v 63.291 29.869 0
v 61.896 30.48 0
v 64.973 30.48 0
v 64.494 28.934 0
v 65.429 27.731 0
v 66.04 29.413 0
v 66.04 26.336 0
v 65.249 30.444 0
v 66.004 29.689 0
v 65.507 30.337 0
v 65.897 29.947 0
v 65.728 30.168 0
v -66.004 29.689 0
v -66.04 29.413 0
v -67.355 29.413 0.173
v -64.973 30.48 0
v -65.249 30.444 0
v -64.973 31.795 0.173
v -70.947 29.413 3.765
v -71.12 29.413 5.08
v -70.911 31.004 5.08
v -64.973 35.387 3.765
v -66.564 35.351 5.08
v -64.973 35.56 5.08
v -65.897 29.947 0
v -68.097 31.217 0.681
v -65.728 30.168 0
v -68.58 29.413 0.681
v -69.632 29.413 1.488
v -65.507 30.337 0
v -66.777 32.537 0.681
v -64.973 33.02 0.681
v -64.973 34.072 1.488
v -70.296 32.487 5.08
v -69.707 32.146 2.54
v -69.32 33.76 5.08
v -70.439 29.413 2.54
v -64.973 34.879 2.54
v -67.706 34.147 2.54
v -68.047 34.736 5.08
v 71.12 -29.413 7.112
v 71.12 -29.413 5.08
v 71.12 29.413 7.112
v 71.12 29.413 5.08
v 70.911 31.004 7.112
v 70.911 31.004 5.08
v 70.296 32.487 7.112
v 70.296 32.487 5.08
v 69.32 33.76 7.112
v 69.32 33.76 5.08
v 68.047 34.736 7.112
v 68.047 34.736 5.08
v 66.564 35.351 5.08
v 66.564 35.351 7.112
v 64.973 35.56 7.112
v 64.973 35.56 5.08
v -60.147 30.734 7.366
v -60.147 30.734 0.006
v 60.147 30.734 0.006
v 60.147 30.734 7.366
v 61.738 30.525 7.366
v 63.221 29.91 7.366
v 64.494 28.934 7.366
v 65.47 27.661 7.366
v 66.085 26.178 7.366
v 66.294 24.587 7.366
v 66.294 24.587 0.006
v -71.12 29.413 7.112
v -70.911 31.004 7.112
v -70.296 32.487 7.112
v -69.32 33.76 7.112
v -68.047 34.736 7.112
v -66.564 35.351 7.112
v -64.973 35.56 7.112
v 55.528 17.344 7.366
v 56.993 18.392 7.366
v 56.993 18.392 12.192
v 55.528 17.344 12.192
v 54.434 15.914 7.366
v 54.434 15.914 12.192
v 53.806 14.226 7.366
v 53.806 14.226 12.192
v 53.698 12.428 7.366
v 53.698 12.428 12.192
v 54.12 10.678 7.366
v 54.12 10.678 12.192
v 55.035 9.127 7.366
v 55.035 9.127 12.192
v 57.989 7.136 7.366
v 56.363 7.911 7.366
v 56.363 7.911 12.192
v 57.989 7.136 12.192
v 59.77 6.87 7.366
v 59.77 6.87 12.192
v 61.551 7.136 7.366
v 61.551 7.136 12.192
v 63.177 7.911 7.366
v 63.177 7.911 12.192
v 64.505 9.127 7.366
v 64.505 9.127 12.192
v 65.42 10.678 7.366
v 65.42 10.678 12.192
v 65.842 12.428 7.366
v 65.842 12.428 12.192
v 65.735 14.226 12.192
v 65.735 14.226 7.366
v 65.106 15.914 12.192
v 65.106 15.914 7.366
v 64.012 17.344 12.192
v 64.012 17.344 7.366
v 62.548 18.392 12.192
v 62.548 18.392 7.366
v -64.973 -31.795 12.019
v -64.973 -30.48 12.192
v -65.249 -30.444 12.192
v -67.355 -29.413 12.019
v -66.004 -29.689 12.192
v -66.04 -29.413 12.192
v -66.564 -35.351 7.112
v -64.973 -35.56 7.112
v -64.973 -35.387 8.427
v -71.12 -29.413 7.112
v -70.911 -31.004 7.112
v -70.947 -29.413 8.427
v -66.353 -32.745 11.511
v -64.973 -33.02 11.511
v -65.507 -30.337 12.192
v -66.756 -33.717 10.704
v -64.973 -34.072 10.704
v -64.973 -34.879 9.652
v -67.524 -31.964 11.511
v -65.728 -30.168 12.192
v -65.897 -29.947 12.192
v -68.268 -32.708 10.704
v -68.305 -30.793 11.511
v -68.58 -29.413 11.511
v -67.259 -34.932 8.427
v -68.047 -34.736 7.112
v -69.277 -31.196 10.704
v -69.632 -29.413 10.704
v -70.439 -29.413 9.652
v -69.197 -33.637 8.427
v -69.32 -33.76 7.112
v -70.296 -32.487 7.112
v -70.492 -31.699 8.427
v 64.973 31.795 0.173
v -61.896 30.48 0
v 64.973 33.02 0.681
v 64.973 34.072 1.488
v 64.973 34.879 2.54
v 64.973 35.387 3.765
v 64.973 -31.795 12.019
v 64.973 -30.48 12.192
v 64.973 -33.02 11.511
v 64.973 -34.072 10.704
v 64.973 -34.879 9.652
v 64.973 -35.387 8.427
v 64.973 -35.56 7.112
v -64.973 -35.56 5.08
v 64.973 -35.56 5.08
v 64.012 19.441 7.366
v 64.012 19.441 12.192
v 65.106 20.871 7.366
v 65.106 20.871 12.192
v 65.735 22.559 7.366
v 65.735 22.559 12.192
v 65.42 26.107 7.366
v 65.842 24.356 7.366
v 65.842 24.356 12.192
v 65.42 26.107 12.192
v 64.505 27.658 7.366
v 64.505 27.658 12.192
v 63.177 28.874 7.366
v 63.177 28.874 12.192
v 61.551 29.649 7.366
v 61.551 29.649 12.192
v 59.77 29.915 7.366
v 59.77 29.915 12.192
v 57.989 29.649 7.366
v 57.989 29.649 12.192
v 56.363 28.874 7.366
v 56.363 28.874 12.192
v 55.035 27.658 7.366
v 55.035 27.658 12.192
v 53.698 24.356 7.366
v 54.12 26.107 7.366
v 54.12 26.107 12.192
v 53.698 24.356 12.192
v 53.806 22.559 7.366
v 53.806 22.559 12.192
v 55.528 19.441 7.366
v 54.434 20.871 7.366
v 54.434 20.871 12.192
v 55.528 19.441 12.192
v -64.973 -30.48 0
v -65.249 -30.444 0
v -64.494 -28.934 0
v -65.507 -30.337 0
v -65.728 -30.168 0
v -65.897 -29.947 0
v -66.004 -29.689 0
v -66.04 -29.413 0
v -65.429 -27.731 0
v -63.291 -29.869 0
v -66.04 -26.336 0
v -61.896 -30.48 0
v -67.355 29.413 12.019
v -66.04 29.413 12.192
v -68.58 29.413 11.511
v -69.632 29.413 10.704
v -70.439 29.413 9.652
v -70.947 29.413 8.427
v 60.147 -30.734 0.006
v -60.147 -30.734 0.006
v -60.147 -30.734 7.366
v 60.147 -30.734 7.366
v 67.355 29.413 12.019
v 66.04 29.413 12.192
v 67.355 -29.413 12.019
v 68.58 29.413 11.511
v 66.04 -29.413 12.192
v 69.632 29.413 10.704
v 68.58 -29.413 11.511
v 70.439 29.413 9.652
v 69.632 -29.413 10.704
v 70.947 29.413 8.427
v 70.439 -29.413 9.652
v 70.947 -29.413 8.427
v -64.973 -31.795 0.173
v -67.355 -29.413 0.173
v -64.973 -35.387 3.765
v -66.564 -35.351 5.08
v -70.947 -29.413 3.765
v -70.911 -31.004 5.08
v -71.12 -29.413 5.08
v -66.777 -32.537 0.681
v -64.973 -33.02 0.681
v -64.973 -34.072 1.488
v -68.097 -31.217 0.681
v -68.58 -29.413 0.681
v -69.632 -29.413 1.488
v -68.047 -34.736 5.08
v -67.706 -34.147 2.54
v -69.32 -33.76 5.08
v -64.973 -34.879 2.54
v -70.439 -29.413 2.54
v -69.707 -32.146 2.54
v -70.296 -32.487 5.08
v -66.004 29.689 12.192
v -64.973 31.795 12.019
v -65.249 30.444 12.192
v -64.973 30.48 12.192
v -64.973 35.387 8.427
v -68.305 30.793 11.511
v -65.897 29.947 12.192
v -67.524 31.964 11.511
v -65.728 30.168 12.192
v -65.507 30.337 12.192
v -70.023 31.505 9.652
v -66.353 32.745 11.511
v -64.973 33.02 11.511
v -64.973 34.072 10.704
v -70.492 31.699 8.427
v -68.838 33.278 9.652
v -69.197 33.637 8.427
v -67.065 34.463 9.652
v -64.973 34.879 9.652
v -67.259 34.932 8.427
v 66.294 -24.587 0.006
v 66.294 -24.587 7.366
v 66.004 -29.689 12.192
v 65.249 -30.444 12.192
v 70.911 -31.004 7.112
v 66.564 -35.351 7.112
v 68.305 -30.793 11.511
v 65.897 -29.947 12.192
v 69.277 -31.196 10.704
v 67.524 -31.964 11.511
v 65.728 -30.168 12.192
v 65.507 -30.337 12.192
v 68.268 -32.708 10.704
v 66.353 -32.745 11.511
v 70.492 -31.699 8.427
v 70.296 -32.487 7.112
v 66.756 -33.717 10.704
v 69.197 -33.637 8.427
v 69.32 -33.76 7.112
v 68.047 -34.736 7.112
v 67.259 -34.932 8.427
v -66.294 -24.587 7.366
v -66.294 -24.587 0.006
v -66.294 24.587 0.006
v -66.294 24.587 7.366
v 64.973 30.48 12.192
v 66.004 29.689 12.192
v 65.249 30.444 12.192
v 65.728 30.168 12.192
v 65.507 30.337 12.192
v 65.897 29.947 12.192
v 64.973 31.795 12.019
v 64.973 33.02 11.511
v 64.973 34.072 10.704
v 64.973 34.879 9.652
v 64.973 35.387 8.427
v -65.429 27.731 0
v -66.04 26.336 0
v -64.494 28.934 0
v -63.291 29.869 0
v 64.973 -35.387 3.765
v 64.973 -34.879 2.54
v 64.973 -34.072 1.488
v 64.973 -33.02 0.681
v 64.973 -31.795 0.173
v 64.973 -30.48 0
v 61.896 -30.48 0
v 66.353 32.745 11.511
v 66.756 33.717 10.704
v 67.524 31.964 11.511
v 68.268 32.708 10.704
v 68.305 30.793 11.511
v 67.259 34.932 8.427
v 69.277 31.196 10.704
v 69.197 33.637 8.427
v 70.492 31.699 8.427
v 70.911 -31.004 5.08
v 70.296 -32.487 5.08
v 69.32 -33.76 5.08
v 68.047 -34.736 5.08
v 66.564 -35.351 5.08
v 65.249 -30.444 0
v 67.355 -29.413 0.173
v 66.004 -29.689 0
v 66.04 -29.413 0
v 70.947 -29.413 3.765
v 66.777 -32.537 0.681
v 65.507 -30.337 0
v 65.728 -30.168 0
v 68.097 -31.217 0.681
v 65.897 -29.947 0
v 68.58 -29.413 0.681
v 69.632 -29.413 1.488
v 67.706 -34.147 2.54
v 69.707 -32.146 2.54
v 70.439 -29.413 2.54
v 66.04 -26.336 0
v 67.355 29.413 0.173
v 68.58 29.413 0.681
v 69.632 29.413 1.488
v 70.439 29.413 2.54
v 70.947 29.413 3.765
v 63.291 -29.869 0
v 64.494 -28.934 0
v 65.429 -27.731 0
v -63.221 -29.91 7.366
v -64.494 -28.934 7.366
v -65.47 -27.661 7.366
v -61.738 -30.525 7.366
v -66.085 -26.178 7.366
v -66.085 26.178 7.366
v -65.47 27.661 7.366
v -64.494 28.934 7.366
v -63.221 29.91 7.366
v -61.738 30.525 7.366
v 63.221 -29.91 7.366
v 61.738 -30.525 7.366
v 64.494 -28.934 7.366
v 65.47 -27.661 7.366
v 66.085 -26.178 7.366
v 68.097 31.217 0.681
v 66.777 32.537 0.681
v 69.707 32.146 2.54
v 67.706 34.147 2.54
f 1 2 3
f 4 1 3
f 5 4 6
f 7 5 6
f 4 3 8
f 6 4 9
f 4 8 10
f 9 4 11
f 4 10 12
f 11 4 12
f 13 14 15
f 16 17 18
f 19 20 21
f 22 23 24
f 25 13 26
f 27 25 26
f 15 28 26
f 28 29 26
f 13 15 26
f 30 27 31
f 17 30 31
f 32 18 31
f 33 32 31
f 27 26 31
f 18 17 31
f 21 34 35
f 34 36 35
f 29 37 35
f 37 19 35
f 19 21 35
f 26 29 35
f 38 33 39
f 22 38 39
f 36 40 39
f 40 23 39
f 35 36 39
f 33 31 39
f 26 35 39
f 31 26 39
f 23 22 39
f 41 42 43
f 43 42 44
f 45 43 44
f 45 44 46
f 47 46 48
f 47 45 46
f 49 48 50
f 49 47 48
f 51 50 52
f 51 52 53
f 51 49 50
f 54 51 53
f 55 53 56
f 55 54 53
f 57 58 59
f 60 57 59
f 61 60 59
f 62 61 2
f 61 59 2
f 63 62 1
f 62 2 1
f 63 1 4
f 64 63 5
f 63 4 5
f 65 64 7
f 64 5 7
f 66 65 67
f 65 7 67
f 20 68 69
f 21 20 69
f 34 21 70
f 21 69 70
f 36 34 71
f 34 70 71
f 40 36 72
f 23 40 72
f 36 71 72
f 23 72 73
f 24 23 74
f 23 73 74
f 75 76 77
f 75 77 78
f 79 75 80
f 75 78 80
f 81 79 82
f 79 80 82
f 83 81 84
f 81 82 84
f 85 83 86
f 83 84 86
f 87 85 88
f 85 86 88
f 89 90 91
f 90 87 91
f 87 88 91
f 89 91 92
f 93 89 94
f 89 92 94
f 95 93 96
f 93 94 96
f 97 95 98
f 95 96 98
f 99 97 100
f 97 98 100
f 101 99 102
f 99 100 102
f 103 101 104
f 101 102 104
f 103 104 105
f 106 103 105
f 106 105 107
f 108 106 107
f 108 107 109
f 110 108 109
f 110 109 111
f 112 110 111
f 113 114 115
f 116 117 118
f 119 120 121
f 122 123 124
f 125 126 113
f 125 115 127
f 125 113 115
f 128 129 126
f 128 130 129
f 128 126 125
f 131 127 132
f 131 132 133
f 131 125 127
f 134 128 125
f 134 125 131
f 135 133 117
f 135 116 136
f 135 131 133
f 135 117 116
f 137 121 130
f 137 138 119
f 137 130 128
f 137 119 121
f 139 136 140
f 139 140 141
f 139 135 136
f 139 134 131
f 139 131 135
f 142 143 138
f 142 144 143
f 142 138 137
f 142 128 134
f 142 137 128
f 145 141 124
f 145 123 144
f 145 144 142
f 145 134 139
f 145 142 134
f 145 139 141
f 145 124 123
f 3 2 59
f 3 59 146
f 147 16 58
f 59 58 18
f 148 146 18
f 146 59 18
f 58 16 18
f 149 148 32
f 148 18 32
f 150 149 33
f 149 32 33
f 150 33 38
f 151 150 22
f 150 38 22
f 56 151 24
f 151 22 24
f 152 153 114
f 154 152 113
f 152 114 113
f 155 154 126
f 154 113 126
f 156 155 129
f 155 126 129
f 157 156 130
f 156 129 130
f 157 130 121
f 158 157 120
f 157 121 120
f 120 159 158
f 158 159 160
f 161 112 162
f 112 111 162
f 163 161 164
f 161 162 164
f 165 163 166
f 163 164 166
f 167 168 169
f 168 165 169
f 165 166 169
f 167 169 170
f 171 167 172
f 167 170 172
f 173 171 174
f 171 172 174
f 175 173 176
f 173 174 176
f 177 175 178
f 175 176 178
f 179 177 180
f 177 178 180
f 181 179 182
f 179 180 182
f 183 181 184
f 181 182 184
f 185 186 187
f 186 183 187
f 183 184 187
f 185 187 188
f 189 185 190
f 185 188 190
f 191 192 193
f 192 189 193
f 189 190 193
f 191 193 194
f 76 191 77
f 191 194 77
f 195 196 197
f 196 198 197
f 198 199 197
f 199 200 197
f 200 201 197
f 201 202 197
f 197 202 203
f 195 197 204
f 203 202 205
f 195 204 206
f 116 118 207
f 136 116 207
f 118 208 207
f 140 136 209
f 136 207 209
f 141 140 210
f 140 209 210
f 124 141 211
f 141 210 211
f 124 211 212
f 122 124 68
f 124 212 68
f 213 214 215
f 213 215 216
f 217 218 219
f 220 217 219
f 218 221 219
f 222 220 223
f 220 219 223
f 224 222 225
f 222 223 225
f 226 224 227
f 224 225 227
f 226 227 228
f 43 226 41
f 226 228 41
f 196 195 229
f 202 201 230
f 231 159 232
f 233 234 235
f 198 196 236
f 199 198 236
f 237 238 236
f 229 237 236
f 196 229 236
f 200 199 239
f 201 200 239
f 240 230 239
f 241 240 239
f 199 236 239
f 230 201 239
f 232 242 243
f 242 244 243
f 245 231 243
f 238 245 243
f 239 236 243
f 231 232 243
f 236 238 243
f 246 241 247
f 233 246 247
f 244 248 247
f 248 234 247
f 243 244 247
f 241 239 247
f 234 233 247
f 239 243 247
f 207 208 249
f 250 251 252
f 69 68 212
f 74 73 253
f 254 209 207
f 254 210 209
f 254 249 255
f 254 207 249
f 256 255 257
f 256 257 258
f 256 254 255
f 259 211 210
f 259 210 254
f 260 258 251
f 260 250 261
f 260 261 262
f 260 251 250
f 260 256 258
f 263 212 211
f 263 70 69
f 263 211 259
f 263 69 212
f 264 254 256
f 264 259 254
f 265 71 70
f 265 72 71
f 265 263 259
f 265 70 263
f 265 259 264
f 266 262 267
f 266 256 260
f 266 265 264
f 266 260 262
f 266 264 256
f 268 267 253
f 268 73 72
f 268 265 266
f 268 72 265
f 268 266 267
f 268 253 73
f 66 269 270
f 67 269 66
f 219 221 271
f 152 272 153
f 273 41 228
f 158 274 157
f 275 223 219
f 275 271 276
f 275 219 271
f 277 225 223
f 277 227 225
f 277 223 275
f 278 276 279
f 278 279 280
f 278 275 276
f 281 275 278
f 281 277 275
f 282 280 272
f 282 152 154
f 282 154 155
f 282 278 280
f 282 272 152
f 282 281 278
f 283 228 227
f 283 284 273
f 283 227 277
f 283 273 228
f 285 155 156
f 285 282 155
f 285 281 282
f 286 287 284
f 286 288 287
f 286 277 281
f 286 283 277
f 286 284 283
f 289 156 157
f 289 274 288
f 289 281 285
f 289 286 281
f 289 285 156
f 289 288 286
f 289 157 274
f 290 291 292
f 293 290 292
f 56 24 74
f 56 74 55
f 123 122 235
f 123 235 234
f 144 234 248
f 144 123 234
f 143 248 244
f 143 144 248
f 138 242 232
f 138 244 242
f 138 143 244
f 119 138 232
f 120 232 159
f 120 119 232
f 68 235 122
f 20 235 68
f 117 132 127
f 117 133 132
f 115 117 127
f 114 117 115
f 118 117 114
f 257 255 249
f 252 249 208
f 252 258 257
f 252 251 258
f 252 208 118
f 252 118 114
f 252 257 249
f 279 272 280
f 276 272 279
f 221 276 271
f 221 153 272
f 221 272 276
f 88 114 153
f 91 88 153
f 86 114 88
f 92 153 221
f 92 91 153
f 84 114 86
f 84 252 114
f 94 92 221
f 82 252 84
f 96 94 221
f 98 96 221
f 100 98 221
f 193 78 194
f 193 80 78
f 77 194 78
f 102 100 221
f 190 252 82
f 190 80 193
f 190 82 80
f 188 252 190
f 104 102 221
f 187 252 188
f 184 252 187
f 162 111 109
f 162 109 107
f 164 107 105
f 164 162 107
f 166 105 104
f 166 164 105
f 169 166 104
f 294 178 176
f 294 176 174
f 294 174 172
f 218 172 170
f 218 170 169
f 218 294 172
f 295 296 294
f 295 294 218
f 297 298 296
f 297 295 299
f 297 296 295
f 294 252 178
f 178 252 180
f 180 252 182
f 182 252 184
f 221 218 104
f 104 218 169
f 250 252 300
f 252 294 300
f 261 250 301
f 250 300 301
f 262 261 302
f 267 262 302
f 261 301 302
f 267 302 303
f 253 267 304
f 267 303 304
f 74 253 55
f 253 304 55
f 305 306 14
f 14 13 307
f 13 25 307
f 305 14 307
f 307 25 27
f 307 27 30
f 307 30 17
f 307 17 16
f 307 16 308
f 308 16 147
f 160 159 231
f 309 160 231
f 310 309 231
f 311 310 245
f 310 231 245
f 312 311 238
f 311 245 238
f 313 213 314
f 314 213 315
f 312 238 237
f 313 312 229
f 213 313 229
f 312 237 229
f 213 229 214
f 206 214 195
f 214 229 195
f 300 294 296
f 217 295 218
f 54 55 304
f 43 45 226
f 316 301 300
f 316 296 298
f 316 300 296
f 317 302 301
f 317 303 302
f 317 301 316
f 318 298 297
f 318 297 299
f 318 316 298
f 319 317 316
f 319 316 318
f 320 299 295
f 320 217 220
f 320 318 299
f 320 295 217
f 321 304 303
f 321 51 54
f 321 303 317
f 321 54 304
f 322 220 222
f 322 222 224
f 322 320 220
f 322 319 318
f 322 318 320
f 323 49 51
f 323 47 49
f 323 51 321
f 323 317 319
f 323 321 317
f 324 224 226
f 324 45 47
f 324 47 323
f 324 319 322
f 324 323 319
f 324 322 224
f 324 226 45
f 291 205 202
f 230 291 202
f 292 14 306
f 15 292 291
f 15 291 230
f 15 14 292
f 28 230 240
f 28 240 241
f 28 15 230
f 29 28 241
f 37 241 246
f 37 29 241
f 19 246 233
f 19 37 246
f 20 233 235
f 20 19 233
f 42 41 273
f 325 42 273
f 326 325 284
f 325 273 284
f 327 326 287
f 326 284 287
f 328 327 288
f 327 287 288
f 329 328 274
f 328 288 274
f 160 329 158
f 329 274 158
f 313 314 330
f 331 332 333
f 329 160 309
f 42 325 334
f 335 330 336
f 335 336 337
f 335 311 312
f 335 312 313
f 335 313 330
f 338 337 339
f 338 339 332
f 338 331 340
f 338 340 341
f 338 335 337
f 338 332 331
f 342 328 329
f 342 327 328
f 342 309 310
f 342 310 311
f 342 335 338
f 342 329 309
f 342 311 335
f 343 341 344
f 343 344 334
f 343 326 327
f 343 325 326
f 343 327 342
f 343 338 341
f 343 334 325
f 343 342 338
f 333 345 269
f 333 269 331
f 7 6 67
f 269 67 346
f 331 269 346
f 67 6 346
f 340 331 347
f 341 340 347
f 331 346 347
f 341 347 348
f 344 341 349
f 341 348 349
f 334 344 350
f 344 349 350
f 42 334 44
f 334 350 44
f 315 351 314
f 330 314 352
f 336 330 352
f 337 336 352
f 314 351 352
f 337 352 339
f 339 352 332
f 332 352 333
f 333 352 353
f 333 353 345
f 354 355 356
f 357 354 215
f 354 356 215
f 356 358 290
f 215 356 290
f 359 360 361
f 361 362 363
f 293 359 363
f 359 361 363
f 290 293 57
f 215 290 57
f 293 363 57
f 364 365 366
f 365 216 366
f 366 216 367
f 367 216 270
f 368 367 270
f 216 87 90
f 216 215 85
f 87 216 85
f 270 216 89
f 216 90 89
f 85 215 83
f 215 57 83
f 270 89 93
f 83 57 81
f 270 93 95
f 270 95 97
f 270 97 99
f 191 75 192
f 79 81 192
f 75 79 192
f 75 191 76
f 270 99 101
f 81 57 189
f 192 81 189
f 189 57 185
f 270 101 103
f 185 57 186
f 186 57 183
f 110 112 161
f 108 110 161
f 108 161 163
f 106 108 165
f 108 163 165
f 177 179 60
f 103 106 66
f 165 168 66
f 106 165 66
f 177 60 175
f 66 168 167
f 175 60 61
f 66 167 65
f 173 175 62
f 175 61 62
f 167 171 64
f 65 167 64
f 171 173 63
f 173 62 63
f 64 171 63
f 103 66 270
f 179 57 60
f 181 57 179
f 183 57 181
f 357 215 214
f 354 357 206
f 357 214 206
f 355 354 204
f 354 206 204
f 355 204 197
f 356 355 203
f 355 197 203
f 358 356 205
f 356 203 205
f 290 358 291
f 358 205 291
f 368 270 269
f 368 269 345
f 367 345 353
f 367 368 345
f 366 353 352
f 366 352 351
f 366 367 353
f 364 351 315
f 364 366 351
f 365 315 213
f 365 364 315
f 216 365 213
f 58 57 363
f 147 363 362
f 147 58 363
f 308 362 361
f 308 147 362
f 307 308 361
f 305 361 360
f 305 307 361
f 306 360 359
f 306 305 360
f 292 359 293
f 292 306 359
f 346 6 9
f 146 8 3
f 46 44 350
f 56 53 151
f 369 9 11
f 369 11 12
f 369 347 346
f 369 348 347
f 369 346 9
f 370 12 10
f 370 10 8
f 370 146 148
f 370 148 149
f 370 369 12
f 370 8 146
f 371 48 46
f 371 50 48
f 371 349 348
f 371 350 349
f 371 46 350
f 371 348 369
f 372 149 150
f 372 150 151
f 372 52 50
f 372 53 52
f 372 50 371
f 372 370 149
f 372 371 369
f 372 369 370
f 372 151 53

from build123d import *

# Parameters (mm, degrees)
F0_W         = 142.24
F0_H         = 71.12
F1_DEPTH     = 12.192
F3_T         = -4.826
F4_D         = 12.192
F5_R         = 6.1468
F6_T1_DEPTH  = 129.9464
F6_T3_DEPTH  = 58.8264
F6_T6_ANGLE  = 90
F6_T8_ANGLE  = 90
F6_T10_ANGLE = 90
F6_T12_ANGLE = 90
F7_R         = 5.08


# Not quite as in the source:
# - a fillet or chamfer that OpenCascade refuses, or shapes differently, is made with other operations: its cross-section is extruded or revolved along the edge and cut away or added
# - a feature names something its author has since deleted; it is built from what else it names


with BuildPart() as f1:
    # F0 (on Top) → F1 (new body)
    with BuildSketch(Plane.XY):
        Rectangle(F0_W, F0_H)
    extrude(amount=F1_DEPTH)

    # F3
    f3_openings = [f1.faces().sort_by_distance(p)[0] for p in [
        (0, 0, 0),
    ]]
    offset(amount=F3_T, openings=f3_openings)

    # F4 (through all)
    with Locations(Plane(origin=(0, 0, 0), x_dir=(1, 0, 0), z_dir=(0, 0, -1))):
        with Locations((59.7701932977, -12.9658412188), (59.7701932977, -23.8187816803)):
            Hole(F4_D / 2)

    # F5
    f5_edges = [f1.edges().sort_by_distance(p)[0] for p in [
        (66.294, -30.734, 3.683),
        (66.294, 30.734, 3.683),
        (-66.294, 30.734, 3.683),
        (-66.294, -30.734, 3.683),
        (-71.12, 35.56, 6.096),
        (-71.12, -35.56, 6.096),
        (71.12, -35.56, 6.096),
        (71.12, 35.56, 6.096),
    ]]
    fillet(f5_edges, radius=F5_R)

    # F6: fillet of radius 5.08 on 1 edges, made by hand

    # F6_s2 → F6_t1 (cut)
    with BuildSketch(Plane.YZ.offset(-64.9732)):
        with BuildLine():
            ThreePointArc((30.48, 0), (34.0721024484, 1.4878975516), (35.56, 5.08))
            Line((35.56, 5.08), (35.56, 0))
            Line((35.56, 0), (30.48, 0))
        make_face()
        with BuildLine():
            ThreePointArc((-35.56, 5.08), (-34.0721024484, 1.4878975516), (-30.48, 0))
            Line((-30.48, 0), (-35.56, 0))
            Line((-35.56, 0), (-35.56, 5.08))
        make_face()
    extrude(amount=F6_T1_DEPTH, mode=Mode.SUBTRACT)

    # F6_s4 → F6_t3 (cut)
    with BuildSketch(Plane.XZ.offset(-29.4132)):
        with BuildLine():
            ThreePointArc((-66.04, 0), (-69.6321024484, 1.4878975516), (-71.12, 5.08))
            Line((-71.12, 5.08), (-71.12, 0))
            Line((-71.12, 0), (-66.04, 0))
        make_face()
        with BuildLine():
            ThreePointArc((66.04, 0), (69.6321024484, 1.4878975516), (71.12, 5.08))
            Line((71.12, 5.08), (71.12, 0))
            Line((71.12, 0), (66.04, 0))
        make_face()
    extrude(amount=F6_T3_DEPTH, mode=Mode.SUBTRACT)

    # F6_s5 → F6_t6 (revolve, cut)
    with BuildSketch(Plane.XZ.offset(-29.4132)):
        with BuildLine():
            ThreePointArc((66.04, 0), (69.6321024484, 1.4878975516), (71.12, 5.08))
            Line((71.12, 5.08), (71.12, 0))
            Line((71.12, 0), (66.04, 0))
        make_face()
    revolve(axis=Axis((64.9732, 29.4132, 0), (0, 0, 1)), revolution_arc=F6_T6_ANGLE, mode=Mode.SUBTRACT)

    # F6_s7 → F6_t8 (revolve, cut)
    with BuildSketch(Plane.XZ.offset(-29.4132)):
        with BuildLine():
            ThreePointArc((-66.04, 0), (-69.6321024484, 1.4878975516), (-71.12, 5.08))
            Line((-71.12, 5.08), (-71.12, 0))
            Line((-71.12, 0), (-66.04, 0))
        make_face()
    revolve(axis=Axis((-64.9732, 29.4132, 0), (0, 0, -1)), revolution_arc=F6_T8_ANGLE, mode=Mode.SUBTRACT)

    # F6_s9 → F6_t10 (revolve, cut)
    with BuildSketch(Plane.YZ.offset(-64.9732)):
        with BuildLine():
            ThreePointArc((-30.48, 0), (-34.0721024484, 1.4878975516), (-35.56, 5.08))
            Line((-35.56, 5.08), (-35.56, 0))
            Line((-35.56, 0), (-30.48, 0))
        make_face()
    revolve(axis=Axis((-64.9732, -29.4132, 0), (0, 0, -1)), revolution_arc=F6_T10_ANGLE, mode=Mode.SUBTRACT)

    # F6_s11 → F6_t12 (revolve, cut)
    with BuildSketch(Plane.YZ.offset(64.9732)):
        with BuildLine():
            ThreePointArc((-30.48, 0), (-34.0721024484, 1.4878975516), (-35.56, 5.08))
            Line((-35.56, 5.08), (-35.56, 0))
            Line((-35.56, 0), (-30.48, 0))
        make_face()
    revolve(axis=Axis((64.9732, -29.4132, 0), (0, 0, 1)), revolution_arc=F6_T12_ANGLE, mode=Mode.SUBTRACT)

    # F7
    f7_edges = [f1.edges().sort_by_distance(p)[0] for p in [
        (0, 35.56, 12.192),
        (69.319644, -33.759644, 12.192),
        (0, -35.56, 12.192),
        (-69.319644, -33.759644, 12.192),
        (-71.12, 0, 12.192),
        (71.12, 0, 12.192),
        (-69.319644, 33.759644, 12.192),
        (69.319644, 33.759644, 12.192),
    ]]
    fillet(f7_edges, radius=F7_R)


solid = f1.part
